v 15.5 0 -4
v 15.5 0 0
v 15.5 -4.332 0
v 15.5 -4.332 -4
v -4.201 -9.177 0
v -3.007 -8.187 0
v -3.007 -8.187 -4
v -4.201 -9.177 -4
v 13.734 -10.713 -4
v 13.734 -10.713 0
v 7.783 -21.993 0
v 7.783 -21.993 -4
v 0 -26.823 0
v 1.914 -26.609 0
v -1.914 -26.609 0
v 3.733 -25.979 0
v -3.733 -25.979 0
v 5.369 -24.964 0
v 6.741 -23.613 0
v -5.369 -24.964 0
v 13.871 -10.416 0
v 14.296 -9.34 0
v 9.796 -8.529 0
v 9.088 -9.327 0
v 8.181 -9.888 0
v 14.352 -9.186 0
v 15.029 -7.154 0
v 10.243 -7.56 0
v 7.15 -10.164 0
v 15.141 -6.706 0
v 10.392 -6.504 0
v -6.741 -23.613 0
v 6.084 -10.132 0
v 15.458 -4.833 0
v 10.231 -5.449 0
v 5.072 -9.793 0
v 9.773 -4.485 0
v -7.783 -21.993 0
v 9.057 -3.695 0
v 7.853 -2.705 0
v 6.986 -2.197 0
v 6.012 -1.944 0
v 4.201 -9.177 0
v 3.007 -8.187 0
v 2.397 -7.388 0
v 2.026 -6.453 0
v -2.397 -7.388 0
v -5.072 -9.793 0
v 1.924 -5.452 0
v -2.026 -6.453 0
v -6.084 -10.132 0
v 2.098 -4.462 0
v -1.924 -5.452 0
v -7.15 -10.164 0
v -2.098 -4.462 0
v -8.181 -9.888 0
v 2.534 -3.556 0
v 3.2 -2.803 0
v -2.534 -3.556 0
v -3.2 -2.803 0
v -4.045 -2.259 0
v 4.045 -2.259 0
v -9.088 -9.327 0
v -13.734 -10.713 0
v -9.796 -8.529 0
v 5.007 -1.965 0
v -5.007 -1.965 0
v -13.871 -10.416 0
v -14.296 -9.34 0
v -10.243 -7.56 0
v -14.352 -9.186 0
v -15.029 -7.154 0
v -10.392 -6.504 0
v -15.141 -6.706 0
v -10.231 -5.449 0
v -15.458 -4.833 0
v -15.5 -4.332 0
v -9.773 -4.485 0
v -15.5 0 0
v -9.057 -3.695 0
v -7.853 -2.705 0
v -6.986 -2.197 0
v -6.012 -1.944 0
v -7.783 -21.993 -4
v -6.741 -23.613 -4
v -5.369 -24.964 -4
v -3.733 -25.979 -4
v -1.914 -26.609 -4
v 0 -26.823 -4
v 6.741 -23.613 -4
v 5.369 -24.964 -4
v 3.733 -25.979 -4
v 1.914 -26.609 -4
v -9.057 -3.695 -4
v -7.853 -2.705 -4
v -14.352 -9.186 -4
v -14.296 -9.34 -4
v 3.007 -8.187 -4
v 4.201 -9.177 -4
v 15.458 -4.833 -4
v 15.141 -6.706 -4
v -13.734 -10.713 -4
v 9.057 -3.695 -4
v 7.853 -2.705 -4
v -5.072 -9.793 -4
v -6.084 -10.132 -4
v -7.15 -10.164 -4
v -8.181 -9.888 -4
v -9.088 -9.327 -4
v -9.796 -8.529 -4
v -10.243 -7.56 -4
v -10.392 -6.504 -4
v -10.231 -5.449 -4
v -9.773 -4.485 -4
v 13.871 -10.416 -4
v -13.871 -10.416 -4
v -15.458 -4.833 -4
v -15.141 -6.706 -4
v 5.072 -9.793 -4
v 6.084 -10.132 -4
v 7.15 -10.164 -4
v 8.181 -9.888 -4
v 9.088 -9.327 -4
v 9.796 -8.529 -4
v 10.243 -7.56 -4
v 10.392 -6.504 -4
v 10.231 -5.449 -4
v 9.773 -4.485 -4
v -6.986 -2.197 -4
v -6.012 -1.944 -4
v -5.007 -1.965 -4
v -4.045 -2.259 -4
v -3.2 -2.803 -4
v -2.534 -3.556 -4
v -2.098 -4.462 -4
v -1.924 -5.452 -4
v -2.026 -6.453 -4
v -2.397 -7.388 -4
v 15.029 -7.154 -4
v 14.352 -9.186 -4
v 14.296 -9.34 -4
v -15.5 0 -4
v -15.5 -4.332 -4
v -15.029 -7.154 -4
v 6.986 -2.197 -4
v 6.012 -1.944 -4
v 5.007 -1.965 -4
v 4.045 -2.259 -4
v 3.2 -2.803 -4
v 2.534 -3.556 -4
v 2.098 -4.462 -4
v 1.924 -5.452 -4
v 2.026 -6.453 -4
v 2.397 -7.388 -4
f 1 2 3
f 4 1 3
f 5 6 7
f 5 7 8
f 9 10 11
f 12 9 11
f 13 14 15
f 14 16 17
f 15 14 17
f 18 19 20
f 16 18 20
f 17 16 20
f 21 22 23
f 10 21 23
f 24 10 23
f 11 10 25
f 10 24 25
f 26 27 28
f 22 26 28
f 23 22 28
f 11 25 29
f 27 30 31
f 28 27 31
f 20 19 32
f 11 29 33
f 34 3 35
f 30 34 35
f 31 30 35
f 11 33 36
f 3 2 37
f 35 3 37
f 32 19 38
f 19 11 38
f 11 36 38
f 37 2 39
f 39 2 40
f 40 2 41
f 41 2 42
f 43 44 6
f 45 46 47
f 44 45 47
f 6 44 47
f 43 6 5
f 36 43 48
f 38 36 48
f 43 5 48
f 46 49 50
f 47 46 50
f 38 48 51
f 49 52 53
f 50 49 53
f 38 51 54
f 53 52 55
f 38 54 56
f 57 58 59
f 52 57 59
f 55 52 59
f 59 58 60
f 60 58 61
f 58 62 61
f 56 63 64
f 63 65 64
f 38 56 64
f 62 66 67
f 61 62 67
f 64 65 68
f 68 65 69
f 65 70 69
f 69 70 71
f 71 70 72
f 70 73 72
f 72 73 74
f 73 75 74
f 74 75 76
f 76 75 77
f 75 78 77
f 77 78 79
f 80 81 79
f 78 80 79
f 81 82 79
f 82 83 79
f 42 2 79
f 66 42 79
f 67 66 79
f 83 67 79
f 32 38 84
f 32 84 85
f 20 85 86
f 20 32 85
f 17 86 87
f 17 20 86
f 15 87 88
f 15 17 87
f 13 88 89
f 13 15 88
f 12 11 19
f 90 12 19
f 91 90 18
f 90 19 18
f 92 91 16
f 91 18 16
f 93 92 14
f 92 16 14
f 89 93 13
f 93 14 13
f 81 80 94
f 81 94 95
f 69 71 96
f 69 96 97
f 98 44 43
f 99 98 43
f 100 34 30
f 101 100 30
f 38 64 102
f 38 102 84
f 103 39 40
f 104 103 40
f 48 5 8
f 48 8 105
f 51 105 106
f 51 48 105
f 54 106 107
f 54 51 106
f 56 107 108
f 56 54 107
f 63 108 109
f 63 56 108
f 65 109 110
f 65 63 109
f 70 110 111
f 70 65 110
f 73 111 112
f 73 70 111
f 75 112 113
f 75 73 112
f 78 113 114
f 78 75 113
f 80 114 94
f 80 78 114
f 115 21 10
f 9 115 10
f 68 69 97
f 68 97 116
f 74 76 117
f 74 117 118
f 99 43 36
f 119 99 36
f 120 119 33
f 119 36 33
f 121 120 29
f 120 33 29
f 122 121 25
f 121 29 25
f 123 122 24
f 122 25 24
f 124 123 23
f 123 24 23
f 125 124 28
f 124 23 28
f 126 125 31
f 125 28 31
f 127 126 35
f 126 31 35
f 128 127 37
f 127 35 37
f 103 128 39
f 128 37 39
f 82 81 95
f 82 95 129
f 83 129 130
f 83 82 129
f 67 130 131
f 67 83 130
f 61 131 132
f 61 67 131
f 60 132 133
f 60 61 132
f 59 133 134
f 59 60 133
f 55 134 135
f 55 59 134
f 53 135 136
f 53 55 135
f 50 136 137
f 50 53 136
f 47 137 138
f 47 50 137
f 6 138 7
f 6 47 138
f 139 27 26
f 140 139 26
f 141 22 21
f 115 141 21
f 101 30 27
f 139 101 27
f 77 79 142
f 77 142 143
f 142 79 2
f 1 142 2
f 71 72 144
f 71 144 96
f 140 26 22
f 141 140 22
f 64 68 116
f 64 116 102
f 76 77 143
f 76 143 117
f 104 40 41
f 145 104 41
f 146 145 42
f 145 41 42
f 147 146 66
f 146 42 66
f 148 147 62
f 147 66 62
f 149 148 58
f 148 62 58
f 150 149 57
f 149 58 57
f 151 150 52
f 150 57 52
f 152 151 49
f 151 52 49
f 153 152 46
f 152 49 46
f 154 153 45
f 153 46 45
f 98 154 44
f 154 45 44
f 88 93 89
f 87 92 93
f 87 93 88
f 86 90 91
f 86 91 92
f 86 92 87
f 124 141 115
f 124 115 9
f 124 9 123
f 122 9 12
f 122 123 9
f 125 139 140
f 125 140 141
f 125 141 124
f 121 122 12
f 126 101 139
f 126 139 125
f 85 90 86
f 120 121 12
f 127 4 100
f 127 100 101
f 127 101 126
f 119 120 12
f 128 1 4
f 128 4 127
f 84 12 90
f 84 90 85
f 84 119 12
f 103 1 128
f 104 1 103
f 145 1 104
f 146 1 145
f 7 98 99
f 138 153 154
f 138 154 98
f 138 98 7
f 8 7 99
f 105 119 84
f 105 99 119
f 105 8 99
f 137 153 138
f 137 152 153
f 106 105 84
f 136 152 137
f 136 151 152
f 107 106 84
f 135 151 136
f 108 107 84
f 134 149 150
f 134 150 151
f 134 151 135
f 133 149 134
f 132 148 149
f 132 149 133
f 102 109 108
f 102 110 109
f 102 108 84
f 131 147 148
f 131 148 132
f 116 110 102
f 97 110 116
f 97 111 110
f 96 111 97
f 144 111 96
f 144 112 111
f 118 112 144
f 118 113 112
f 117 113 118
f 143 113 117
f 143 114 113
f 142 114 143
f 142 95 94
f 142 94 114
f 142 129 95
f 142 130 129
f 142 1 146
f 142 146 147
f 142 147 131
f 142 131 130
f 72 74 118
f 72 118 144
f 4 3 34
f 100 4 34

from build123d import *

# Parameters (mm, degrees)
F1_DEPTH = 4


with BuildPart() as f1:
    # F0 (on Top) → F1 (new body)
    with BuildSketch(Plane.XY):
        with BuildLine():
            Line((0, -23.741776), (0, 0))
            Line((0, 0), (-12.5, 0))
            Line((-12.5, 0), (-15.5, 0))
            Line((-15.5, 0), (-15.5, -4.3325))
            Line((-15.5, -4.3325), (-15.457999, -4.832742))
            Line((-15.457999, -4.832742), (-15.141206, -6.705982))
            Line((-15.141206, -6.705982), (-15.029257, -7.154422))
            Line((-15.029257, -7.154422), (-14.352191, -9.185621))
            Line((-14.352191, -9.185621), (-14.295931, -9.340147))
            Line((-14.295931, -9.340147), (-13.870512, -10.415947))
            Line((-13.870512, -10.415947), (-13.734117, -10.712556))
            Line((-13.734117, -10.712556), (-7.782776, -21.993459))
            ThreePointArc((-7.782776, -21.993459), (-4.579278, -25.516799), (0, -26.823145))
            Line((0, -26.823145), (0, -23.741776))
        make_face()
        with BuildLine():
            Line((-9.056534, -3.694688), (-7.853357, -2.704581))
            ThreePointArc((-7.853357, -2.704581), (-2.840883, -3.156518), (-3.007137, -8.186578))
            Line((-3.007137, -8.186578), (-4.200585, -9.17746))
            ThreePointArc((-4.200585, -9.17746), (-9.471274, -8.953792), (-9.056534, -3.694688))
        make_face(mode=Mode.SUBTRACT)
    extrude(amount=-F1_DEPTH)

    # F2: F1 across plane


with BuildPart() as f1_1:
    add(f1.part)
    add(f1.part.mirror(Plane.YZ))


solid = f1_1.part
